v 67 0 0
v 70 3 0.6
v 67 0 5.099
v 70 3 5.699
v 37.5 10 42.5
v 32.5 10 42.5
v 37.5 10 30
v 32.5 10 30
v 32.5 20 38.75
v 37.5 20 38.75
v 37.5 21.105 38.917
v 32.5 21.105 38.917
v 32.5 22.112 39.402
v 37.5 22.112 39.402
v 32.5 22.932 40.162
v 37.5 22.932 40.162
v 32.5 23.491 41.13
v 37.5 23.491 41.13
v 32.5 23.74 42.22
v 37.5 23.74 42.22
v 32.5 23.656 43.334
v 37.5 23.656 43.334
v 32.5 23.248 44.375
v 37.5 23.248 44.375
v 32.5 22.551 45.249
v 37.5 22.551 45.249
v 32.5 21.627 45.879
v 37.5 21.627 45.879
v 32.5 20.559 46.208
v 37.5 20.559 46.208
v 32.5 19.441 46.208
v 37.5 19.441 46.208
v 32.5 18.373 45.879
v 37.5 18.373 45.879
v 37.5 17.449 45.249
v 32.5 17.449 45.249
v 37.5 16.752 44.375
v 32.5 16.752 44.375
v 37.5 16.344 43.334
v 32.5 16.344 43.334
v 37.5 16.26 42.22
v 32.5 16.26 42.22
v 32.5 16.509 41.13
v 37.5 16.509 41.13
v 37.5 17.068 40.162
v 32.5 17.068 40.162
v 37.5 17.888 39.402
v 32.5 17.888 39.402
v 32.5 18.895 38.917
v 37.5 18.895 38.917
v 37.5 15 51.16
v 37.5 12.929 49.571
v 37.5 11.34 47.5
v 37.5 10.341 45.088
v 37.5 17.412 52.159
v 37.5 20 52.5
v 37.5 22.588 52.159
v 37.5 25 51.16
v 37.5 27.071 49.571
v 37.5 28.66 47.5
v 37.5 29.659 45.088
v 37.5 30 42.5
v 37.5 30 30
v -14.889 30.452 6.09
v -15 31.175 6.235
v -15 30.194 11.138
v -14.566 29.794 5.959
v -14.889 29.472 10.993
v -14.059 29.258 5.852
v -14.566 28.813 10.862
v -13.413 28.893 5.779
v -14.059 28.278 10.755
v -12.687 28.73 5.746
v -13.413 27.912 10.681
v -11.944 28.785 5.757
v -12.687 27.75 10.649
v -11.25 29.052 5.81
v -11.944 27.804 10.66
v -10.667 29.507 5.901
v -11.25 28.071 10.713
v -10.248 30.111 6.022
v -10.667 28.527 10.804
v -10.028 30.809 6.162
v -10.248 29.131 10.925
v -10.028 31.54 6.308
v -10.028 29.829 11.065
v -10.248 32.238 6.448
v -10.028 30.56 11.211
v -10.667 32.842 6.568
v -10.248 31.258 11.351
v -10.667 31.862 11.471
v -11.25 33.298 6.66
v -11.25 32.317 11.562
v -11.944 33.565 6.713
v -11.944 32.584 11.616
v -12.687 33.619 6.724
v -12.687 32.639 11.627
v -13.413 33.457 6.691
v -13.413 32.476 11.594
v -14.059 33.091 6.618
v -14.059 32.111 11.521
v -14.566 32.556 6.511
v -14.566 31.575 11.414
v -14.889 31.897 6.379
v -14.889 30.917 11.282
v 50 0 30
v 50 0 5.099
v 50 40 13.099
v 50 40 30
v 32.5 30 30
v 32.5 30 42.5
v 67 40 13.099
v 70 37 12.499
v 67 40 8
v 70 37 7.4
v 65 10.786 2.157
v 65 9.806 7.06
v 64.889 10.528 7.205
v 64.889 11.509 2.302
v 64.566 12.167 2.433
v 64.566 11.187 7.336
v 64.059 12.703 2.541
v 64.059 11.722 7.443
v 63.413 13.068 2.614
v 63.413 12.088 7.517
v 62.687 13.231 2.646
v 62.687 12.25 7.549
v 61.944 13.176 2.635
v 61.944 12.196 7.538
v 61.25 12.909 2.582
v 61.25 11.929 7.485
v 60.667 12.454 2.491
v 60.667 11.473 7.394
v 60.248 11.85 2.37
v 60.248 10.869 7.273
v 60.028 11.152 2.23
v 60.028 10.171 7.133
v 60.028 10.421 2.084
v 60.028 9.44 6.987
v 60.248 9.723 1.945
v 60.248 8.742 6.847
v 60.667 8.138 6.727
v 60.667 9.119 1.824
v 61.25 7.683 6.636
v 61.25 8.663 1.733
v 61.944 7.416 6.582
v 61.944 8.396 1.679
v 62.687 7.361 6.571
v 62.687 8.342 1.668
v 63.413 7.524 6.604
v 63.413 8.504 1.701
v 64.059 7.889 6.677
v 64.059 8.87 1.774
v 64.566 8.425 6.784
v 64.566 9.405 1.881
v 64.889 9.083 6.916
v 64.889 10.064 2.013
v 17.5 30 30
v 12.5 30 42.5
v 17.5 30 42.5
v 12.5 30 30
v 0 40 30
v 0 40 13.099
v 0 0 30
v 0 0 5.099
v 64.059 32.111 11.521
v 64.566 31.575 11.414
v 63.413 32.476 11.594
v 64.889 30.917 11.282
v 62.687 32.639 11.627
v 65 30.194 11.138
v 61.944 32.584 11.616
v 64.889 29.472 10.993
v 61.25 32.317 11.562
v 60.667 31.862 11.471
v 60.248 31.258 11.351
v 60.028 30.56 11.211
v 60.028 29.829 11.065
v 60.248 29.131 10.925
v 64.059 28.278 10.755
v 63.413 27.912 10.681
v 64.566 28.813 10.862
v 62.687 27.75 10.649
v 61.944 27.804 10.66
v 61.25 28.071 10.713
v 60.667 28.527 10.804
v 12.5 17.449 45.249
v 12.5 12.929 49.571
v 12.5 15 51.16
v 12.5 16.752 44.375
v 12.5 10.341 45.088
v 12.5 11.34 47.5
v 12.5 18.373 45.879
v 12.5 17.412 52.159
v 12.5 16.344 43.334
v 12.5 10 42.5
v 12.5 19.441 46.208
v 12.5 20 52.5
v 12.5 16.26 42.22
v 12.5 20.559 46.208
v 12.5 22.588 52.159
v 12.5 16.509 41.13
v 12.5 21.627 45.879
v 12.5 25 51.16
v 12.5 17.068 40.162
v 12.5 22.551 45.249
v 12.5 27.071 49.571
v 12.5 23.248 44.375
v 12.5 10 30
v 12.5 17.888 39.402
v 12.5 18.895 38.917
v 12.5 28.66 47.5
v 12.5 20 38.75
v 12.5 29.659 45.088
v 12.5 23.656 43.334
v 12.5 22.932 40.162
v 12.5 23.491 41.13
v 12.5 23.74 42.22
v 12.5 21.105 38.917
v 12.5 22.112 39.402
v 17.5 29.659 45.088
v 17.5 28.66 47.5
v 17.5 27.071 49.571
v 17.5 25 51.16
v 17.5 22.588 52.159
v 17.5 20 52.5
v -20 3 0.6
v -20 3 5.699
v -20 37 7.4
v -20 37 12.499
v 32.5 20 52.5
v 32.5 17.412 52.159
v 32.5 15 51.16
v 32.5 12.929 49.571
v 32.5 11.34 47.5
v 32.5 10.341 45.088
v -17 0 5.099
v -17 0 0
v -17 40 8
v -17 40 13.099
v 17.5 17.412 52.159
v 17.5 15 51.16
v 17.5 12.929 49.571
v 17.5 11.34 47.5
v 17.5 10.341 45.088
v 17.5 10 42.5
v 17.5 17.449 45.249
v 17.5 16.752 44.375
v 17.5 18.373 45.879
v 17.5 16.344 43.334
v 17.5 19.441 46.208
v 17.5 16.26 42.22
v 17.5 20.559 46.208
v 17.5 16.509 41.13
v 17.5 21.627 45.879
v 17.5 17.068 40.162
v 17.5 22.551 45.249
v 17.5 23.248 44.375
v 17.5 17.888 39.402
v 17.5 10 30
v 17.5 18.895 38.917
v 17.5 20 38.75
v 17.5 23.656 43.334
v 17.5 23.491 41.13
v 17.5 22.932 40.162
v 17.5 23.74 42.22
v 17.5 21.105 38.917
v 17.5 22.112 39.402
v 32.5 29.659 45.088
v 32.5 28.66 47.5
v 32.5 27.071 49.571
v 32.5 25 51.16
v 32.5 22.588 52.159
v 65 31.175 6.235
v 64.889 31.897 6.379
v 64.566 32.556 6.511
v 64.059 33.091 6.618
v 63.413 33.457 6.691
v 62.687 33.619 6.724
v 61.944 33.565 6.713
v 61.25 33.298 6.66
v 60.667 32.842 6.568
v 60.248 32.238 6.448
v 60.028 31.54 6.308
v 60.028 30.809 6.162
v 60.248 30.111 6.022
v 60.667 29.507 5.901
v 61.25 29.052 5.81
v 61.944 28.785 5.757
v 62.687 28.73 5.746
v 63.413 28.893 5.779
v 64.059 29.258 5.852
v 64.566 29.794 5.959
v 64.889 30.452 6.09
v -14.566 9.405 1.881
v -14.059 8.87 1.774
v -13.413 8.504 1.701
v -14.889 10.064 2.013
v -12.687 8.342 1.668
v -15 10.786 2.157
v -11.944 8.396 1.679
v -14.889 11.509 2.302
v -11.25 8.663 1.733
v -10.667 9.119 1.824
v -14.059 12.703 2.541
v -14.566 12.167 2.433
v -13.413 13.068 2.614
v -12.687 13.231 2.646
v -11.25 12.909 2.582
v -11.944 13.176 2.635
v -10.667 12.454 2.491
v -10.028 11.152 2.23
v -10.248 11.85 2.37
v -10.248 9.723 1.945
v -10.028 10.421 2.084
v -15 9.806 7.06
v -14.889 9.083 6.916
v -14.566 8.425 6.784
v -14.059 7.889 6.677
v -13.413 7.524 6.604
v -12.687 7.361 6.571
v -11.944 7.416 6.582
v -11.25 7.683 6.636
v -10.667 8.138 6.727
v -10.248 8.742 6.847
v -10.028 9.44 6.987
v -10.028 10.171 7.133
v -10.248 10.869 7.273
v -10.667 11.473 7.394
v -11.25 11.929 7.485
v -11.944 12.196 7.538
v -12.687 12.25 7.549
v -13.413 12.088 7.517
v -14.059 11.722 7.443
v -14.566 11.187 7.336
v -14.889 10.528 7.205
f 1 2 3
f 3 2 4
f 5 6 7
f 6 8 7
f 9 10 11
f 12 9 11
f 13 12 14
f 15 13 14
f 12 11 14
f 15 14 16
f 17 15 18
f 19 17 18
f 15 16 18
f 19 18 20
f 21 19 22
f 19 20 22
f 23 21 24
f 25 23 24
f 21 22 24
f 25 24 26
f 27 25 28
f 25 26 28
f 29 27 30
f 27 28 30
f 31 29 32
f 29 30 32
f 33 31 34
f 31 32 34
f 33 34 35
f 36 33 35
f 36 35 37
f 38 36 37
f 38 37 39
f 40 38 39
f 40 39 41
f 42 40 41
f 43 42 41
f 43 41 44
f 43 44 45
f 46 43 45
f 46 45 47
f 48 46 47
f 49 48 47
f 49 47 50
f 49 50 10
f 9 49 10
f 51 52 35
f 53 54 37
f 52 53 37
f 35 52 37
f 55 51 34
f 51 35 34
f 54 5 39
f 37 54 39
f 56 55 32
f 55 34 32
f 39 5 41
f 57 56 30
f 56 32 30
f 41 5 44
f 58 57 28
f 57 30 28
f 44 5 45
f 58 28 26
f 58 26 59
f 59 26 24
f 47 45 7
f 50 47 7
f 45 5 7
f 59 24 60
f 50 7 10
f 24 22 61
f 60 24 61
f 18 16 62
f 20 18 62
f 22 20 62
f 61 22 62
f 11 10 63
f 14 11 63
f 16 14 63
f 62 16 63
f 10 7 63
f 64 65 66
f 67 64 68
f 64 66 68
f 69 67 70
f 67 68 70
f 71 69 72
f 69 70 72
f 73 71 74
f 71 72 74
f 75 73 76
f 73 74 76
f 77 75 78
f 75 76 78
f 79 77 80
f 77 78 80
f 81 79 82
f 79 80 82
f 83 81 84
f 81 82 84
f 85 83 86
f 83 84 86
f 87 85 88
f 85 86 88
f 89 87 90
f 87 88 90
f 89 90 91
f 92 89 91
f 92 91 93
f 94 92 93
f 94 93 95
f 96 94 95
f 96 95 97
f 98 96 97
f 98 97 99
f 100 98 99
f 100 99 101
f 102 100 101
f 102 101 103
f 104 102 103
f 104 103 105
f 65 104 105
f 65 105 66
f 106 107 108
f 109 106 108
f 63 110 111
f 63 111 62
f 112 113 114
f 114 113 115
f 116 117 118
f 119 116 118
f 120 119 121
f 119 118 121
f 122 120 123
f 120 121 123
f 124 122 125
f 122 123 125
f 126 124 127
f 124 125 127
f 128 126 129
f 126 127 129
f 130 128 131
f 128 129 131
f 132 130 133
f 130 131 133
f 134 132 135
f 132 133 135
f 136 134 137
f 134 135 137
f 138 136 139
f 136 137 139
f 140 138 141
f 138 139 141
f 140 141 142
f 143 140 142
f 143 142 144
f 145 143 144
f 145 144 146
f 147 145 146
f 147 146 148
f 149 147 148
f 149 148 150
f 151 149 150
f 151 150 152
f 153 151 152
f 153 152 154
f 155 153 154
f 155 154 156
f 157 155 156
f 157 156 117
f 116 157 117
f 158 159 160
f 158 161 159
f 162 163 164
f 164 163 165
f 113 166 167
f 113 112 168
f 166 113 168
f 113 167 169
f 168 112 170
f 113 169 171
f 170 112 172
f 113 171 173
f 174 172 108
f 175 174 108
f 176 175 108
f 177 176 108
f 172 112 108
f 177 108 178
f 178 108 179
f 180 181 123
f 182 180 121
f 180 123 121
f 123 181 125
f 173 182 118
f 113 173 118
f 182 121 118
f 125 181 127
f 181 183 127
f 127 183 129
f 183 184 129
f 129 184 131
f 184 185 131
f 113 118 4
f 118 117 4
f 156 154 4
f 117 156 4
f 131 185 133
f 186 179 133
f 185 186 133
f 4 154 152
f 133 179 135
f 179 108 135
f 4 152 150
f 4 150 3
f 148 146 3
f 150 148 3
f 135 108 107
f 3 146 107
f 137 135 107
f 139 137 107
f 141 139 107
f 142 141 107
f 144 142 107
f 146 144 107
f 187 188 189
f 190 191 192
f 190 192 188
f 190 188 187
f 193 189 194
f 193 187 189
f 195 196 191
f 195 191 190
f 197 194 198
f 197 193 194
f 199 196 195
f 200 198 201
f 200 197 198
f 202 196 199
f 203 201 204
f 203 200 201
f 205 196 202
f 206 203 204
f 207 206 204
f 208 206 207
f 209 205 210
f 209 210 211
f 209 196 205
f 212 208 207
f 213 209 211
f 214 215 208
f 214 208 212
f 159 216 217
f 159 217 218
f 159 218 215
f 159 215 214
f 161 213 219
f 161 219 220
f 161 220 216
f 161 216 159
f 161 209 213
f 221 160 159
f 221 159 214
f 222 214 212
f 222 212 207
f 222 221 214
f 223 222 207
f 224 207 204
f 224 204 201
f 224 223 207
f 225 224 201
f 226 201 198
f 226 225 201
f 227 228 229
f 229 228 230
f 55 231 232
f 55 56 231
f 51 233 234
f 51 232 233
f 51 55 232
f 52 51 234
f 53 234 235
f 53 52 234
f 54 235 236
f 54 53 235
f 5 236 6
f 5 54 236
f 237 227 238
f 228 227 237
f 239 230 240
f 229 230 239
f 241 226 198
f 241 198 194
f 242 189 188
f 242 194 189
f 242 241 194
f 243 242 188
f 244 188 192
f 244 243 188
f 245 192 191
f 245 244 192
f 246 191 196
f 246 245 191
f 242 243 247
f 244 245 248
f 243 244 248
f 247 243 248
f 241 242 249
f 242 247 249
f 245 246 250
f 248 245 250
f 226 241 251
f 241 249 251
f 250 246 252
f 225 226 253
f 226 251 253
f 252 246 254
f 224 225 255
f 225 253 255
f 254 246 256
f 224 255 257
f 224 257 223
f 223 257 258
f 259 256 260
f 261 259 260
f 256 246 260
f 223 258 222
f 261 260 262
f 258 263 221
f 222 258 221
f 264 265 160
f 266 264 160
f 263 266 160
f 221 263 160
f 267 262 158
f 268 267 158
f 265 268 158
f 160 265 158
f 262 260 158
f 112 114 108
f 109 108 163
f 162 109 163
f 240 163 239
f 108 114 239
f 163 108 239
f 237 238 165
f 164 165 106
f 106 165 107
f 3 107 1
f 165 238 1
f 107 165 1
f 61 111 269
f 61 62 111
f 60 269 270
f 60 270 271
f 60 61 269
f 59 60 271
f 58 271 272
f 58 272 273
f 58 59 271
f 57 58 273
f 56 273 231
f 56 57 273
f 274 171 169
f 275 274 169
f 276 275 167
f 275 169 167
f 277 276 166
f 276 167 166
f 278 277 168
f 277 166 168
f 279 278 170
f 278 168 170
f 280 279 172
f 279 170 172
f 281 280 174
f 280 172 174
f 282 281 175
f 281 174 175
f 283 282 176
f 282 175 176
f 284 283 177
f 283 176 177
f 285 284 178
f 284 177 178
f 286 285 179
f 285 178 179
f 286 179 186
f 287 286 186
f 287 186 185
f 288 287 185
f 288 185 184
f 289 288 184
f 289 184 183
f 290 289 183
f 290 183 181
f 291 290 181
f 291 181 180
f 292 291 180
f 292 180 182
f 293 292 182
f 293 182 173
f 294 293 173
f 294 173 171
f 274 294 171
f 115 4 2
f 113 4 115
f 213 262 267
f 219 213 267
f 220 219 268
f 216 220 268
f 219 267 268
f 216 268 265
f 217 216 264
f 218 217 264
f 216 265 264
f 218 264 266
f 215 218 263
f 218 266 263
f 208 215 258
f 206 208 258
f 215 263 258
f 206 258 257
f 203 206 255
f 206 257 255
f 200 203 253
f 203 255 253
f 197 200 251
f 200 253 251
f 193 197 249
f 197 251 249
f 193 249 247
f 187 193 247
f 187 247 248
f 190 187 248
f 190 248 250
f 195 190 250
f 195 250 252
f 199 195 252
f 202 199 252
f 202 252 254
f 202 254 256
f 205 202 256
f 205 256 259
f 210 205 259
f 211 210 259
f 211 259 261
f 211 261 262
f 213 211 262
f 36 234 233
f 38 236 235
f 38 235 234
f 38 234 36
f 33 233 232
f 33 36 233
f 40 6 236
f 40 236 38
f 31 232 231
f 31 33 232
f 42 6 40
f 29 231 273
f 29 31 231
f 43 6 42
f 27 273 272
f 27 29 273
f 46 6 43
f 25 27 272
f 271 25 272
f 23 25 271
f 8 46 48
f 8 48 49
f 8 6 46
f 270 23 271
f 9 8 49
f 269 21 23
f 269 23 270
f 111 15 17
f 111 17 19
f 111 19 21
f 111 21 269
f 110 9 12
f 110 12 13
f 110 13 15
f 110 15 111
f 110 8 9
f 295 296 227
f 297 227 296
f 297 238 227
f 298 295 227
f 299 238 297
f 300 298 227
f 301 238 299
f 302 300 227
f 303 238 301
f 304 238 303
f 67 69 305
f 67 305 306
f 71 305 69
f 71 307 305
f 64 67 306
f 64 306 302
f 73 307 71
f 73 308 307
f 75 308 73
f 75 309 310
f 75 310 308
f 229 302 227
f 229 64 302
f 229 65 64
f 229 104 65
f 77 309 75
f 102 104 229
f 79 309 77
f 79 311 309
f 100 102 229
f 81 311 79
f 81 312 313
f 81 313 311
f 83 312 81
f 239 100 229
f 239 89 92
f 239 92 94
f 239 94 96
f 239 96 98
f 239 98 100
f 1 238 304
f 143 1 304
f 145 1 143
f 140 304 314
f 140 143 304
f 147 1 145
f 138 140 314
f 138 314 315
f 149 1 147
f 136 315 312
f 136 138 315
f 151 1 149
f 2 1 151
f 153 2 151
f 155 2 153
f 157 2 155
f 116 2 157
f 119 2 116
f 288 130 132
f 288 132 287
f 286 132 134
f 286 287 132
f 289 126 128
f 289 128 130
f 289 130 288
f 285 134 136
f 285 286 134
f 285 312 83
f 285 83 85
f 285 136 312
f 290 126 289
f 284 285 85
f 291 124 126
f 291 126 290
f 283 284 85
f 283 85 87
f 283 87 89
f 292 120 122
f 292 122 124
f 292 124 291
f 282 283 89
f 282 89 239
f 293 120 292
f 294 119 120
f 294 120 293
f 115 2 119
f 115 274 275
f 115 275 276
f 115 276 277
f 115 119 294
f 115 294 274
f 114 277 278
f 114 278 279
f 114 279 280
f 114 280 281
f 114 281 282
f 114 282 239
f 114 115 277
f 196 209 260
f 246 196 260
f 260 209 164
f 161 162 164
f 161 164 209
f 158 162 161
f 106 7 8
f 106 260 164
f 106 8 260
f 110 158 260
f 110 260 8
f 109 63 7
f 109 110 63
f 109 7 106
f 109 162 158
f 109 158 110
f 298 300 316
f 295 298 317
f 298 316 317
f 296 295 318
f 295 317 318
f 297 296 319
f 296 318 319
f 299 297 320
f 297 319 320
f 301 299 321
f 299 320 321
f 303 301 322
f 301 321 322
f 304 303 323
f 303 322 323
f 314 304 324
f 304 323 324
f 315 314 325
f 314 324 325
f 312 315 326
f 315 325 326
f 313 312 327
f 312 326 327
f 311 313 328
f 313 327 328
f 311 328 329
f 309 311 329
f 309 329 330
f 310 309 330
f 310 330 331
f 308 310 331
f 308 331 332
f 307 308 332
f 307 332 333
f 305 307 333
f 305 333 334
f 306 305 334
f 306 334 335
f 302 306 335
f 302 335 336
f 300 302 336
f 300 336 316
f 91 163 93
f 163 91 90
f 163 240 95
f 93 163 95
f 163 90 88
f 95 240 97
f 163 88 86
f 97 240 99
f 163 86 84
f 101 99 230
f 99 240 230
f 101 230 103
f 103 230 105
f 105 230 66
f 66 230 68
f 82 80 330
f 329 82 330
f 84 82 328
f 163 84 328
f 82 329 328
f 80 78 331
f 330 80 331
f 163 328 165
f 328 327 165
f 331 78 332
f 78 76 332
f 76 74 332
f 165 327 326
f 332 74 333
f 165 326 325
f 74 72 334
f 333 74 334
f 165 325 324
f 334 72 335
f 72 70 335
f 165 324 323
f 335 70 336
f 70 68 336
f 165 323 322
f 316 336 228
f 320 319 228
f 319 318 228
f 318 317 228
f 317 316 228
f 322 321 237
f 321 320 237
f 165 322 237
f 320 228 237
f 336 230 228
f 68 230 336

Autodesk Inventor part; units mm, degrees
ref_plane "XZ Plane" through (0, 0, 0) normal (0, 1, 0) x (-1, 0, 0)
ref_plane "XY Plane" through (0, 0, 0) normal (0, 0, 1) x (1, 0, 0)
ref_plane "Work Plane1" through (25, 0, 0) normal (1, 0, 0) x (0, 1, 0)
sketch "Sketch1" plane through (0, 0, 0) normal (0, 0, 1) x (1, 0, 0)
  line L0 (0, 0) -> (50, 0)
  line L1 (50, 0) -> (50, 40)
  line L2 (50, 40) -> (0, 40)
  line L3 (0, 40) -> (0, 0)
  dimension "d0" = 50
  dimension "d1" = 40
extrude "Extrusion1" add sketch "Sketch1" along normal blind 30
sketch "Sketch3" plane through (50, 0, 0) normal (1, 0, 0) x (0, 0, -1)
  line L0 (0, 0) -> (-8, 40)
  line L1 (0, 40) -> (-30, 40) projected
  line L2 (0, 0) -> (40.7922, 0) construction
  arc A0 (0, 40) -> (-8, 40) centre (-4, 20) ccw
  line L3 (0, 0) -> (0, 40) projected
  line L4 (0, 40) -> (0, 0)
  dimension "d7" = 101.31
extrude "Extrusion3" cut sketch "Sketch3" against normal through all contours L0 L1 L3
sketch "Sketch4" plane through (0, 0, 30) normal (0, 0, 1) x (1, 0, 0)
  line L0 (0, 0) -> (50, 0) construction
  line L1 (25, 0) -> (25, 40) construction
  line L2 (50, 40) -> (0, 40) construction
  line L3 (0, 40) -> (0, 0) construction
  line L4 (0, 20) -> (50, 20) construction
  line L5 (50, 0) -> (50, 40) construction
  line L6 (17.5, 10) -> (17.5, 30)
  line L7 (32.5, 10) -> (32.5, 30)
  line L8 (12.5, 10) -> (12.5, 30)
  line L9 (37.5, 10) -> (37.5, 30)
  line L10 (12.5, 10) -> (17.5, 10)
  line L11 (32.5, 10) -> (37.5, 10)
  line L12 (12.5, 30) -> (17.5, 30)
  line L13 (32.5, 30) -> (37.5, 30)
  dimension "d12" = 7.5
  dimension "d13" = 7.5
  dimension "d14" = 5
  dimension "d15" = 20
  dimension "d16" = 5
  dimension "d17" = 20
  dimension "d18" = 10
  dimension "d19" = 10
extrude "Extrusion4" add sketch "Sketch4" along normal blind 22.5
fillet "Fillet1" radius 10 4 edges at (15, 10, 52.5) (15, 30, 52.5) (35, 10, 52.5) (35, 30, 52.5)
sketch "Sketch5" plane through (37.5, 10, 30) normal (1, 0, 0) x (0, 0, -1)
  arc A0 (-12.5, 20) -> (-12.5, 0) centre (-12.5, 10) ccw projected
  line L0 (-12.5, 0) -> (-12.5, 20) construction
  circle A1 centre (-12.5, 10) radius 3.75
  point P0 (30, -10)
  dimension "d23" = 7.5
extrude "Extrusion5" cut sketch "Sketch5" against normal through all
sketch "Sketch6" plane through (25, 0, 0) normal (1, 0, 0) x (0, 1, 0)
  line L0 (40, 8) -> (40, 30) projected
  line L1 (0, 0) -> (40, 8)
  line L2 (40, 8) -> (40, 13.0991)
  line L3 (40, 13.0991) -> (0, 5.099)
  line L4 (0, 5.099) -> (0, 0)
  dimension "d27" = 5
extrude "Extrusion6" add sketch "Sketch6" along normal mid plane 90
sketch "Sketch7" plane through (50, 0, 5.099) normal (0, -0.1961173, 0.9805804) x (1, 0, 0)
  circle A0 centre (12.5, 10) radius 2.5
  circle A1 centre (12.5, 30.7922) radius 2.5
  line L0 (20, 40.7922) -> (20, 0) projected
  line L1 (0, 0) -> (20, 0) projected
  line L2 (0, 40.7922) -> (20, 40.7922) projected
  point P0 (-50, -1)
  dimension "d30" = 5
  dimension "d31" = 5
  dimension "d32" = 7.5
  dimension "d33" = 7.5
  dimension "d34" = 10
  dimension "d35" = 10
extrude "Extrusion7" cut sketch "Sketch7" against normal through all
mirror "Mirror1" about plane through (25, 0, 0) normal (1, 0, 0) of "Extrusion7"
chamfer "Chamfer1" distance 3 angle 45 4 edges at (70, 0, 2.5495) (70, 40, 10.5496) (-20, 0, 2.5495) (-20, 40, 10.5496)
properties part number "Base"
